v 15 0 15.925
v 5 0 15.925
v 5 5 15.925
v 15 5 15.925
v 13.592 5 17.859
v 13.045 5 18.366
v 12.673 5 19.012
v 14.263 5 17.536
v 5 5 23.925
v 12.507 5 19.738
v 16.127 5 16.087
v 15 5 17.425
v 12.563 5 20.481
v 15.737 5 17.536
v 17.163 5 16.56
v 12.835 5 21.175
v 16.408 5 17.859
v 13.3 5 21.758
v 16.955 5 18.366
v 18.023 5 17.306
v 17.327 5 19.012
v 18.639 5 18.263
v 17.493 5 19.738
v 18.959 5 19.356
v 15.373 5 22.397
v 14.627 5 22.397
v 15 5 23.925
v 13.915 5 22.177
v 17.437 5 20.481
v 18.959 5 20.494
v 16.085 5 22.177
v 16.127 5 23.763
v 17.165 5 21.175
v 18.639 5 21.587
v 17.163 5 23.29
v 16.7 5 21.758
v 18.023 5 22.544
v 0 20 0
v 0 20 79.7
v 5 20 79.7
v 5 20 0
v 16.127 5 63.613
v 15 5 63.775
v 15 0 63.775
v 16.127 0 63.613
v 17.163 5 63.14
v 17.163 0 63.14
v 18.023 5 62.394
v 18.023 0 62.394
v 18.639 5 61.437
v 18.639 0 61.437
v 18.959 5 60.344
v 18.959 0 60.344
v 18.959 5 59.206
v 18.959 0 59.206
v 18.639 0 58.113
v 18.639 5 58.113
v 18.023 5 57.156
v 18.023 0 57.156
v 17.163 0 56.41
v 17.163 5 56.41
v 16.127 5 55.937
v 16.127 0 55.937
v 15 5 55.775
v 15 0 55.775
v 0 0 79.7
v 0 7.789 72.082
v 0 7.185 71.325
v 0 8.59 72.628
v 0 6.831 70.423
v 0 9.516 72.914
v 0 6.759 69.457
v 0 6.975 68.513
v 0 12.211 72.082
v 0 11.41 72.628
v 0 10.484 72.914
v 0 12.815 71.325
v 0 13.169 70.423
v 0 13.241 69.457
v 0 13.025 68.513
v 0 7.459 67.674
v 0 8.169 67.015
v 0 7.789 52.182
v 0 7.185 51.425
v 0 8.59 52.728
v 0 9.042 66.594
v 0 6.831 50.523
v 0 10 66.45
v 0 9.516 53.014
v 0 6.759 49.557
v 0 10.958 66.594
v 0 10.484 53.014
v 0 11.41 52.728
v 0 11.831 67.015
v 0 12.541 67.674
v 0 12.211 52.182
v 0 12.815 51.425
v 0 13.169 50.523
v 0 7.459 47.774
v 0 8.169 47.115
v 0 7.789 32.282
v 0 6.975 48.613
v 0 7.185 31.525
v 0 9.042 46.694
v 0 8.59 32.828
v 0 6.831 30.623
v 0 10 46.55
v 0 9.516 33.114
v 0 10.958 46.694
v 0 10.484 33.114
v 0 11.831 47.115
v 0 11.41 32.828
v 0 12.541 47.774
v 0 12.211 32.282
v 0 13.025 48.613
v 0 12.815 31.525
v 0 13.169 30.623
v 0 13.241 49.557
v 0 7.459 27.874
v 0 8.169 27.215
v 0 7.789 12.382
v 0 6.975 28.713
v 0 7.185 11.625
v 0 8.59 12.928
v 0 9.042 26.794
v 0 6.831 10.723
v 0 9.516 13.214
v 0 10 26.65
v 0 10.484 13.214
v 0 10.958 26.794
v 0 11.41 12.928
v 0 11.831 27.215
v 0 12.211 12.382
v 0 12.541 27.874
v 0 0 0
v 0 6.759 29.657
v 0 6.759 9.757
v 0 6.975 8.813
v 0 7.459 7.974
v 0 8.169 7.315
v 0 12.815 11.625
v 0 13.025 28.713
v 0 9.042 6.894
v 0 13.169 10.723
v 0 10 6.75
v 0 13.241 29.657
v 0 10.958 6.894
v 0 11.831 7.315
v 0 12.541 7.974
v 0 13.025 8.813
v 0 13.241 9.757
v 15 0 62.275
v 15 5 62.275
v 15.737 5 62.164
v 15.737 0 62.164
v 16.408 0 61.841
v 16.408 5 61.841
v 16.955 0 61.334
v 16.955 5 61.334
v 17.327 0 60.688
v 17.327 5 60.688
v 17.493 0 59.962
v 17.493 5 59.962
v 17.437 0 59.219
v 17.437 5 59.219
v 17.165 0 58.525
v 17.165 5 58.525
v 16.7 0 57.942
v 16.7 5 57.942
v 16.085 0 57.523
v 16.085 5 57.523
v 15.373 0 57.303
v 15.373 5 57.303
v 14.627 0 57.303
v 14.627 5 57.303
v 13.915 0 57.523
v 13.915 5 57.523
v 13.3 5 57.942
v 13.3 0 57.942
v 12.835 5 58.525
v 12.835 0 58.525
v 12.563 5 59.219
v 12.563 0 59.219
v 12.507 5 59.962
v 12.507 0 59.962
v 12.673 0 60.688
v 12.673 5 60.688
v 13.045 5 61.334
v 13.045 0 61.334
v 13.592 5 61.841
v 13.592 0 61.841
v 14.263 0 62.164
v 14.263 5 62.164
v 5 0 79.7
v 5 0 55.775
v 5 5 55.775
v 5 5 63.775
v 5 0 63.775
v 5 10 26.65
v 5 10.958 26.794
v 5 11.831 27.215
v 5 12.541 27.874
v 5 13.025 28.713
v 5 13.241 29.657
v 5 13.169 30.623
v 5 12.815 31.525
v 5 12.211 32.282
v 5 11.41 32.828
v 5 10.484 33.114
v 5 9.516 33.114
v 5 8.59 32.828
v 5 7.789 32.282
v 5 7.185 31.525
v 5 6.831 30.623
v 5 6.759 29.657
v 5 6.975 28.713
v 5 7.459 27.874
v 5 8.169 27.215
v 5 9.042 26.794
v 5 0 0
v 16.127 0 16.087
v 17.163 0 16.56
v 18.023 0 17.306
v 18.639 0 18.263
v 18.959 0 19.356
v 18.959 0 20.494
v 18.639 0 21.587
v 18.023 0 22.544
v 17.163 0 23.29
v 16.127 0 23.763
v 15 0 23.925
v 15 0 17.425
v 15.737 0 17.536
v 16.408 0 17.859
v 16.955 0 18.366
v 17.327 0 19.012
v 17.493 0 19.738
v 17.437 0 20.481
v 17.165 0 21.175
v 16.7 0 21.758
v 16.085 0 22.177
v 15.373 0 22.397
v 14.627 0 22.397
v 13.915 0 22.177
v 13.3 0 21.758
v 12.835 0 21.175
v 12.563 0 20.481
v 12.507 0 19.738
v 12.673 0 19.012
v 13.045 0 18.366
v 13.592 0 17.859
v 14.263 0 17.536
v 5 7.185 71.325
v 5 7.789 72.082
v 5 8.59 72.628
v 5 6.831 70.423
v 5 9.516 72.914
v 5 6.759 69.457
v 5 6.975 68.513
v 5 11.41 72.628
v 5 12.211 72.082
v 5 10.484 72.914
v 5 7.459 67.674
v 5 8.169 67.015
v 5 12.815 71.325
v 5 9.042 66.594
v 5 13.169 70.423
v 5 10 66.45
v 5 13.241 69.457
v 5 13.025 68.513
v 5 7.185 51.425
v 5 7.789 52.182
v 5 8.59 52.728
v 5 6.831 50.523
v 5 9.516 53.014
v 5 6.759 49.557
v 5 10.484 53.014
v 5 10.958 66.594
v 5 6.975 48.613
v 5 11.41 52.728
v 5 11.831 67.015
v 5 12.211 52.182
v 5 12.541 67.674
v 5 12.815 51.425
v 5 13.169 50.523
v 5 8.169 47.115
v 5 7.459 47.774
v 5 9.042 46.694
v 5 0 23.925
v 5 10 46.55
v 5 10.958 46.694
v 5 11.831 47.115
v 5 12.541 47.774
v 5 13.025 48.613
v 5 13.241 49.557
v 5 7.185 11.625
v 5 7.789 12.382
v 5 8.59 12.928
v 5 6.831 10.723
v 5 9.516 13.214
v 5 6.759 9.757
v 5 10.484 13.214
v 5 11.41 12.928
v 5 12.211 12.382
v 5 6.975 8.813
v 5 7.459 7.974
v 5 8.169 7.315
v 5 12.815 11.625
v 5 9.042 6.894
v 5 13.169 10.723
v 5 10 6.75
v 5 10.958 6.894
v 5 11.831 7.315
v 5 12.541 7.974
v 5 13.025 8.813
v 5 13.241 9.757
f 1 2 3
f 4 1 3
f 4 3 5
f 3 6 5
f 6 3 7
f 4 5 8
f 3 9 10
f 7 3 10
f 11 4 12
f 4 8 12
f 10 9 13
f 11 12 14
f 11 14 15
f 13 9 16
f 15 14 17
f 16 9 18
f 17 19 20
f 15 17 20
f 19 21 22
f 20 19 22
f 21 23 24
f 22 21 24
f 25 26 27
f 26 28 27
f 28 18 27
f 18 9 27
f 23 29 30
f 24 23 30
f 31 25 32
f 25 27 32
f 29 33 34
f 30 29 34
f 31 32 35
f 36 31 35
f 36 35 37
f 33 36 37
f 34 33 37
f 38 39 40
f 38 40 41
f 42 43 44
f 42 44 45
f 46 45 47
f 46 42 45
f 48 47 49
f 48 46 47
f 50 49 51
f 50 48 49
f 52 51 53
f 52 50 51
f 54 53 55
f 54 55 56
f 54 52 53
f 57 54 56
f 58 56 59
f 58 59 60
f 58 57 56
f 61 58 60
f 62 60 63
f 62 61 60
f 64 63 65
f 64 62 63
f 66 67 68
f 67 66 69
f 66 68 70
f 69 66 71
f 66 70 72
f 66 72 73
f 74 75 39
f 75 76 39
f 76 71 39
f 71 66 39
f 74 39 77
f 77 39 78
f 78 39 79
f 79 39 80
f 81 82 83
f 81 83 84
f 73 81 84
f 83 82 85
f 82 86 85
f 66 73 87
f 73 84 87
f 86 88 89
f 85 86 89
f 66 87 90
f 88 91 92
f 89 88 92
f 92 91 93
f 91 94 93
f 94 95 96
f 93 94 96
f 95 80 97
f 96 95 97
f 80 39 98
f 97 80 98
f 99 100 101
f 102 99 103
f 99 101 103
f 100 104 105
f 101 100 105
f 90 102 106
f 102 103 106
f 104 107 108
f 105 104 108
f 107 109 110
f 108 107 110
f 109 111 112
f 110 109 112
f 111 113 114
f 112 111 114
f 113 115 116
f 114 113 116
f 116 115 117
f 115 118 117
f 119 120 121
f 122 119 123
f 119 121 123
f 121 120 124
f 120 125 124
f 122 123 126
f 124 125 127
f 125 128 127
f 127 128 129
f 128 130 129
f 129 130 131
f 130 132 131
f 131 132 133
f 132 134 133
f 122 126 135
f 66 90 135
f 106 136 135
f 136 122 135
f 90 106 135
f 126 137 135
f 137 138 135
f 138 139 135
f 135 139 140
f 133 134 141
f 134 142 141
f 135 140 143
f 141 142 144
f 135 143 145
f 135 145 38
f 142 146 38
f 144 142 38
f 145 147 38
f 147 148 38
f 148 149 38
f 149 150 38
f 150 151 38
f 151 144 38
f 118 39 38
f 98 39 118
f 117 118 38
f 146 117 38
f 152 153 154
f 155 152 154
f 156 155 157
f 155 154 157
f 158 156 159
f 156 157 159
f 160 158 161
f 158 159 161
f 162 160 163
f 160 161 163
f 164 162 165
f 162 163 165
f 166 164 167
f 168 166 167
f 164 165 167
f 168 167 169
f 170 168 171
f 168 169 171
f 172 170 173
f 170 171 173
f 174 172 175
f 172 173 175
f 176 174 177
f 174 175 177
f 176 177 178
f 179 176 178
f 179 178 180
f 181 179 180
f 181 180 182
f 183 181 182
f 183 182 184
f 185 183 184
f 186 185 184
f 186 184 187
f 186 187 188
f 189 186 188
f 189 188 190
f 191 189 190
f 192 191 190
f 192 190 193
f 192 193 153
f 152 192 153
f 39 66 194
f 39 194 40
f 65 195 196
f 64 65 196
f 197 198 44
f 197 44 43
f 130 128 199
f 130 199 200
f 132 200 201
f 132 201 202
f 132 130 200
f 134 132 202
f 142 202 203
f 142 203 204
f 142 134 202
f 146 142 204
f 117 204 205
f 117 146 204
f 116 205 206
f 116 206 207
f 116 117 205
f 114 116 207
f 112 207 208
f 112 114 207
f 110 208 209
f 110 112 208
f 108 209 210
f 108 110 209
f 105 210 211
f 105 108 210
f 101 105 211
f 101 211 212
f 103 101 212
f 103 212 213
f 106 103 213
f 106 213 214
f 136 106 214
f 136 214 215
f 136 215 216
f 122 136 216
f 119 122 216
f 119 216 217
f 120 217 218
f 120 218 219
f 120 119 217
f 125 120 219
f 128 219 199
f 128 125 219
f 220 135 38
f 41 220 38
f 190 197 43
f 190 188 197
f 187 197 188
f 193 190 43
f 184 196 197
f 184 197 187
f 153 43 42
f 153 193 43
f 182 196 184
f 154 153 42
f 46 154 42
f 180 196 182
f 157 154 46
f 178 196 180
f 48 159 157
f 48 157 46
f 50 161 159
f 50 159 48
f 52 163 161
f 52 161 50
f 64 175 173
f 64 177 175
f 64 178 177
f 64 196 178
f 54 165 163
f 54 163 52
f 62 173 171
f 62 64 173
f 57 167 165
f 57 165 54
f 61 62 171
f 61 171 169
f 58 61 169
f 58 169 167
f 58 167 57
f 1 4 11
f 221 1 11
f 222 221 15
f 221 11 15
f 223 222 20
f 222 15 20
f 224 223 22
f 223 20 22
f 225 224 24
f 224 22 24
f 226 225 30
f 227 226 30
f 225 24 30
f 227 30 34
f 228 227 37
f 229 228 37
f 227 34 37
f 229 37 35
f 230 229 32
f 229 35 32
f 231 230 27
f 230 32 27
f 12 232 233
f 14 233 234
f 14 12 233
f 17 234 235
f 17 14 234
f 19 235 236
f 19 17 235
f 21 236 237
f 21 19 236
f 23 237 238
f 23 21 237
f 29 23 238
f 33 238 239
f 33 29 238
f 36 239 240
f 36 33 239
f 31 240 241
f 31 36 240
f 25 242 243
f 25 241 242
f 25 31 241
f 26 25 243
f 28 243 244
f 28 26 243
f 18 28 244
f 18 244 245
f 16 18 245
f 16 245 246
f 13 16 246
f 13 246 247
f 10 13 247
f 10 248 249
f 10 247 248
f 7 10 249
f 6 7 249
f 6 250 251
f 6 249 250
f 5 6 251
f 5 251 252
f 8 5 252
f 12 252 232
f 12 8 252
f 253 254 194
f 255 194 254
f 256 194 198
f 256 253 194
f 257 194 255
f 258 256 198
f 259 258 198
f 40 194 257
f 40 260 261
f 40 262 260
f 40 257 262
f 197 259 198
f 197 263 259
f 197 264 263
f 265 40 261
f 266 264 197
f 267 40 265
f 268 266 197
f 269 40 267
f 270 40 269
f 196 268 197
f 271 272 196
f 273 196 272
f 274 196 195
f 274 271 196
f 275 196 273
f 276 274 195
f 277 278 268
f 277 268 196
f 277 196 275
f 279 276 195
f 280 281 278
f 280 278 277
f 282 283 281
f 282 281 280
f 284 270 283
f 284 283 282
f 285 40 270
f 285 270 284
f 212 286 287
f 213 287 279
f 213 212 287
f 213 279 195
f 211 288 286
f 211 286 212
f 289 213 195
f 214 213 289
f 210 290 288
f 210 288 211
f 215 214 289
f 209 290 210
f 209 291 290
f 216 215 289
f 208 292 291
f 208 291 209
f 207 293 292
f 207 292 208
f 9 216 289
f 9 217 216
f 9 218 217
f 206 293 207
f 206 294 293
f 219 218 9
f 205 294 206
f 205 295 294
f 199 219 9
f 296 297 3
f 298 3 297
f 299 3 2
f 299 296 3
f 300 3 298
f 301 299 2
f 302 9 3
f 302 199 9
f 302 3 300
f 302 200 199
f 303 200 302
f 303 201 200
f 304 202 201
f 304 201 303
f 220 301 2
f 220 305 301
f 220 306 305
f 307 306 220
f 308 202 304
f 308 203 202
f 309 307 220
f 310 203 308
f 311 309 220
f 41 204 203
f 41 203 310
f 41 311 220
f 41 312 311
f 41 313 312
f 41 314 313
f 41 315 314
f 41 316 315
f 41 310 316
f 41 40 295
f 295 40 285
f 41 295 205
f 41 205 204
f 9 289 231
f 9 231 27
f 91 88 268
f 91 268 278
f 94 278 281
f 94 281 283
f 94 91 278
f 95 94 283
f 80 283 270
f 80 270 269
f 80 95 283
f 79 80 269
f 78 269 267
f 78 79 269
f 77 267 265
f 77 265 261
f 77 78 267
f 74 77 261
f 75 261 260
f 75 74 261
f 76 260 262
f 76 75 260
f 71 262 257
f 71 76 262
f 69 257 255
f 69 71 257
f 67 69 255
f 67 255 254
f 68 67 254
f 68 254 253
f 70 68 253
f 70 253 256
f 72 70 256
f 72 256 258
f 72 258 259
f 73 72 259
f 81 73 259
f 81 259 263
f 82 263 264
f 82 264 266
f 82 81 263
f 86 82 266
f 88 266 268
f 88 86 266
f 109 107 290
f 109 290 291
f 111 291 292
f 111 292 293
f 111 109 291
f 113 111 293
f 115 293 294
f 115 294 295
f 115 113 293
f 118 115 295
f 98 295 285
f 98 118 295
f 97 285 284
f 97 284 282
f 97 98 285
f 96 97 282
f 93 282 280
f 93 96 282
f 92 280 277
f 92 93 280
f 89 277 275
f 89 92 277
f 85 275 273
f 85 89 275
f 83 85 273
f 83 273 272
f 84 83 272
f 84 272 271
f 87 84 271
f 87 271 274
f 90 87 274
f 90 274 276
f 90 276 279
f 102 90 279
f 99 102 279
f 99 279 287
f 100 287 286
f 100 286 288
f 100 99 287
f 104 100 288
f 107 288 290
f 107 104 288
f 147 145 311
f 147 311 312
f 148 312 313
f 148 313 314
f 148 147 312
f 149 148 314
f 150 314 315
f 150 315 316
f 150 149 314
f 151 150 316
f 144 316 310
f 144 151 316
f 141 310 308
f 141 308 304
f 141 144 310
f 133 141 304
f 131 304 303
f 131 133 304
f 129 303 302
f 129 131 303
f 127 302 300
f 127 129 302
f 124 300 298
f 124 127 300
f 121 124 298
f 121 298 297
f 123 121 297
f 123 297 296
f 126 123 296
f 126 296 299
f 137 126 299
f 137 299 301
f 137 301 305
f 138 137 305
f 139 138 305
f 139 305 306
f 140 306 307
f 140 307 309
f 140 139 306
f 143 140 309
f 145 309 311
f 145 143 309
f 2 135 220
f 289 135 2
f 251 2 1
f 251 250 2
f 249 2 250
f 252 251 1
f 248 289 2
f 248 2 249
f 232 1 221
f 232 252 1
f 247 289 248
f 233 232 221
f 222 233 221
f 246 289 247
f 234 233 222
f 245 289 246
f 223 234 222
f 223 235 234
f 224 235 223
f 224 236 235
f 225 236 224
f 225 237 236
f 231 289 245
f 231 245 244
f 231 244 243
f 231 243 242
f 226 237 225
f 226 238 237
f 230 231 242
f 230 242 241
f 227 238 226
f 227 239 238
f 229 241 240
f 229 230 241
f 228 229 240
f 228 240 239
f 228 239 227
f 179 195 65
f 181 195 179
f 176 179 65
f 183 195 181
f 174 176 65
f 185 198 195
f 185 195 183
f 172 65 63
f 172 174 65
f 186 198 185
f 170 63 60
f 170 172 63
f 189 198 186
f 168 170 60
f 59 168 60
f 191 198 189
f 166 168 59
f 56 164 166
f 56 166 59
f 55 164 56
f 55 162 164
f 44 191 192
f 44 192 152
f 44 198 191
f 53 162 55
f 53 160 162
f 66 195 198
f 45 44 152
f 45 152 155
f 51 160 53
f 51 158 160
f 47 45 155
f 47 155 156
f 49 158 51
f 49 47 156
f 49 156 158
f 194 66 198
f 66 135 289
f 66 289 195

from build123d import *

# Parameters (mm, degrees)
SKETCH1_W           = 79.7
SKETCH1_H           = 20
SKETCH1_R           = 3.25
BOSS_EXTRUDE1_DEPTH = 5
SKETCH2_W           = 8
SKETCH2_H           = 5
BOSS_EXTRUDE2_DEPTH = 10
BOSS_EXTRUDE3_DEPTH = 5
SKETCH3_6_R         = 2.5
CUT_EXTRUDE2_DEPTH  = 84.295197941


with BuildPart() as part:
    # Sketch1 → Boss-Extrude1 (new body)
    with BuildSketch(Plane(origin=(0, 0, 0), x_dir=(0, 0, -1), z_dir=(1, 0, 0))):
        with Locations((-39.85, 10)):
            Rectangle(SKETCH1_W, SKETCH1_H)
        with Locations((-29.9, 10)):
            Circle(SKETCH1_R, mode=Mode.SUBTRACT)
        with Locations((-49.8, 10)):
            Circle(SKETCH1_R, mode=Mode.SUBTRACT)
        with Locations((-69.7, 10)):
            Circle(SKETCH1_R, mode=Mode.SUBTRACT)
        with Locations((-10, 10)):
            Circle(SKETCH1_R, mode=Mode.SUBTRACT)
    extrude(amount=BOSS_EXTRUDE1_DEPTH)

    # Sketch2 → Boss-Extrude2 (add)
    with BuildSketch(Plane(origin=(5, 0, 0), x_dir=(0, 0, -1), z_dir=(1, 0, 0))):
        with Locations((-19.925, 2.5)):
            Rectangle(SKETCH2_W, SKETCH2_H)
        with Locations((-59.775, 2.5)):
            Rectangle(SKETCH2_W, SKETCH2_H)
    extrude(amount=BOSS_EXTRUDE2_DEPTH)

    # Sketch3 → Boss-Extrude3 (add)
    with BuildSketch(Plane(origin=(0, 5, 0), x_dir=(1, 0, 0), z_dir=(0, 1, 0))):
        with BuildLine():
            Line((15, -55.775), (15, -63.775))
            ThreePointArc((15, -63.775), (19, -59.775), (15, -55.775))
        make_face()
    boss_extrude3 = extrude(amount=-BOSS_EXTRUDE3_DEPTH)

    # Sketch3<6> → Cut-Extrude2 (cut, through all)
    with BuildSketch(Plane(origin=(0, 5, 0), x_dir=(1, 0, 0), z_dir=(0, 1, 0))):
        with Locations((15, -59.775)):
            Circle(SKETCH3_6_R)
    cut_extrude2 = extrude(amount=-CUT_EXTRUDE2_DEPTH, mode=Mode.SUBTRACT)

    # Mirror1: Boss-Extrude3, Cut-Extrude2 across plane
    add(boss_extrude3.mirror(Plane.XY.offset(39.85)))
    add(cut_extrude2.mirror(Plane.XY.offset(39.85)), mode=Mode.SUBTRACT)


solid = part.part
